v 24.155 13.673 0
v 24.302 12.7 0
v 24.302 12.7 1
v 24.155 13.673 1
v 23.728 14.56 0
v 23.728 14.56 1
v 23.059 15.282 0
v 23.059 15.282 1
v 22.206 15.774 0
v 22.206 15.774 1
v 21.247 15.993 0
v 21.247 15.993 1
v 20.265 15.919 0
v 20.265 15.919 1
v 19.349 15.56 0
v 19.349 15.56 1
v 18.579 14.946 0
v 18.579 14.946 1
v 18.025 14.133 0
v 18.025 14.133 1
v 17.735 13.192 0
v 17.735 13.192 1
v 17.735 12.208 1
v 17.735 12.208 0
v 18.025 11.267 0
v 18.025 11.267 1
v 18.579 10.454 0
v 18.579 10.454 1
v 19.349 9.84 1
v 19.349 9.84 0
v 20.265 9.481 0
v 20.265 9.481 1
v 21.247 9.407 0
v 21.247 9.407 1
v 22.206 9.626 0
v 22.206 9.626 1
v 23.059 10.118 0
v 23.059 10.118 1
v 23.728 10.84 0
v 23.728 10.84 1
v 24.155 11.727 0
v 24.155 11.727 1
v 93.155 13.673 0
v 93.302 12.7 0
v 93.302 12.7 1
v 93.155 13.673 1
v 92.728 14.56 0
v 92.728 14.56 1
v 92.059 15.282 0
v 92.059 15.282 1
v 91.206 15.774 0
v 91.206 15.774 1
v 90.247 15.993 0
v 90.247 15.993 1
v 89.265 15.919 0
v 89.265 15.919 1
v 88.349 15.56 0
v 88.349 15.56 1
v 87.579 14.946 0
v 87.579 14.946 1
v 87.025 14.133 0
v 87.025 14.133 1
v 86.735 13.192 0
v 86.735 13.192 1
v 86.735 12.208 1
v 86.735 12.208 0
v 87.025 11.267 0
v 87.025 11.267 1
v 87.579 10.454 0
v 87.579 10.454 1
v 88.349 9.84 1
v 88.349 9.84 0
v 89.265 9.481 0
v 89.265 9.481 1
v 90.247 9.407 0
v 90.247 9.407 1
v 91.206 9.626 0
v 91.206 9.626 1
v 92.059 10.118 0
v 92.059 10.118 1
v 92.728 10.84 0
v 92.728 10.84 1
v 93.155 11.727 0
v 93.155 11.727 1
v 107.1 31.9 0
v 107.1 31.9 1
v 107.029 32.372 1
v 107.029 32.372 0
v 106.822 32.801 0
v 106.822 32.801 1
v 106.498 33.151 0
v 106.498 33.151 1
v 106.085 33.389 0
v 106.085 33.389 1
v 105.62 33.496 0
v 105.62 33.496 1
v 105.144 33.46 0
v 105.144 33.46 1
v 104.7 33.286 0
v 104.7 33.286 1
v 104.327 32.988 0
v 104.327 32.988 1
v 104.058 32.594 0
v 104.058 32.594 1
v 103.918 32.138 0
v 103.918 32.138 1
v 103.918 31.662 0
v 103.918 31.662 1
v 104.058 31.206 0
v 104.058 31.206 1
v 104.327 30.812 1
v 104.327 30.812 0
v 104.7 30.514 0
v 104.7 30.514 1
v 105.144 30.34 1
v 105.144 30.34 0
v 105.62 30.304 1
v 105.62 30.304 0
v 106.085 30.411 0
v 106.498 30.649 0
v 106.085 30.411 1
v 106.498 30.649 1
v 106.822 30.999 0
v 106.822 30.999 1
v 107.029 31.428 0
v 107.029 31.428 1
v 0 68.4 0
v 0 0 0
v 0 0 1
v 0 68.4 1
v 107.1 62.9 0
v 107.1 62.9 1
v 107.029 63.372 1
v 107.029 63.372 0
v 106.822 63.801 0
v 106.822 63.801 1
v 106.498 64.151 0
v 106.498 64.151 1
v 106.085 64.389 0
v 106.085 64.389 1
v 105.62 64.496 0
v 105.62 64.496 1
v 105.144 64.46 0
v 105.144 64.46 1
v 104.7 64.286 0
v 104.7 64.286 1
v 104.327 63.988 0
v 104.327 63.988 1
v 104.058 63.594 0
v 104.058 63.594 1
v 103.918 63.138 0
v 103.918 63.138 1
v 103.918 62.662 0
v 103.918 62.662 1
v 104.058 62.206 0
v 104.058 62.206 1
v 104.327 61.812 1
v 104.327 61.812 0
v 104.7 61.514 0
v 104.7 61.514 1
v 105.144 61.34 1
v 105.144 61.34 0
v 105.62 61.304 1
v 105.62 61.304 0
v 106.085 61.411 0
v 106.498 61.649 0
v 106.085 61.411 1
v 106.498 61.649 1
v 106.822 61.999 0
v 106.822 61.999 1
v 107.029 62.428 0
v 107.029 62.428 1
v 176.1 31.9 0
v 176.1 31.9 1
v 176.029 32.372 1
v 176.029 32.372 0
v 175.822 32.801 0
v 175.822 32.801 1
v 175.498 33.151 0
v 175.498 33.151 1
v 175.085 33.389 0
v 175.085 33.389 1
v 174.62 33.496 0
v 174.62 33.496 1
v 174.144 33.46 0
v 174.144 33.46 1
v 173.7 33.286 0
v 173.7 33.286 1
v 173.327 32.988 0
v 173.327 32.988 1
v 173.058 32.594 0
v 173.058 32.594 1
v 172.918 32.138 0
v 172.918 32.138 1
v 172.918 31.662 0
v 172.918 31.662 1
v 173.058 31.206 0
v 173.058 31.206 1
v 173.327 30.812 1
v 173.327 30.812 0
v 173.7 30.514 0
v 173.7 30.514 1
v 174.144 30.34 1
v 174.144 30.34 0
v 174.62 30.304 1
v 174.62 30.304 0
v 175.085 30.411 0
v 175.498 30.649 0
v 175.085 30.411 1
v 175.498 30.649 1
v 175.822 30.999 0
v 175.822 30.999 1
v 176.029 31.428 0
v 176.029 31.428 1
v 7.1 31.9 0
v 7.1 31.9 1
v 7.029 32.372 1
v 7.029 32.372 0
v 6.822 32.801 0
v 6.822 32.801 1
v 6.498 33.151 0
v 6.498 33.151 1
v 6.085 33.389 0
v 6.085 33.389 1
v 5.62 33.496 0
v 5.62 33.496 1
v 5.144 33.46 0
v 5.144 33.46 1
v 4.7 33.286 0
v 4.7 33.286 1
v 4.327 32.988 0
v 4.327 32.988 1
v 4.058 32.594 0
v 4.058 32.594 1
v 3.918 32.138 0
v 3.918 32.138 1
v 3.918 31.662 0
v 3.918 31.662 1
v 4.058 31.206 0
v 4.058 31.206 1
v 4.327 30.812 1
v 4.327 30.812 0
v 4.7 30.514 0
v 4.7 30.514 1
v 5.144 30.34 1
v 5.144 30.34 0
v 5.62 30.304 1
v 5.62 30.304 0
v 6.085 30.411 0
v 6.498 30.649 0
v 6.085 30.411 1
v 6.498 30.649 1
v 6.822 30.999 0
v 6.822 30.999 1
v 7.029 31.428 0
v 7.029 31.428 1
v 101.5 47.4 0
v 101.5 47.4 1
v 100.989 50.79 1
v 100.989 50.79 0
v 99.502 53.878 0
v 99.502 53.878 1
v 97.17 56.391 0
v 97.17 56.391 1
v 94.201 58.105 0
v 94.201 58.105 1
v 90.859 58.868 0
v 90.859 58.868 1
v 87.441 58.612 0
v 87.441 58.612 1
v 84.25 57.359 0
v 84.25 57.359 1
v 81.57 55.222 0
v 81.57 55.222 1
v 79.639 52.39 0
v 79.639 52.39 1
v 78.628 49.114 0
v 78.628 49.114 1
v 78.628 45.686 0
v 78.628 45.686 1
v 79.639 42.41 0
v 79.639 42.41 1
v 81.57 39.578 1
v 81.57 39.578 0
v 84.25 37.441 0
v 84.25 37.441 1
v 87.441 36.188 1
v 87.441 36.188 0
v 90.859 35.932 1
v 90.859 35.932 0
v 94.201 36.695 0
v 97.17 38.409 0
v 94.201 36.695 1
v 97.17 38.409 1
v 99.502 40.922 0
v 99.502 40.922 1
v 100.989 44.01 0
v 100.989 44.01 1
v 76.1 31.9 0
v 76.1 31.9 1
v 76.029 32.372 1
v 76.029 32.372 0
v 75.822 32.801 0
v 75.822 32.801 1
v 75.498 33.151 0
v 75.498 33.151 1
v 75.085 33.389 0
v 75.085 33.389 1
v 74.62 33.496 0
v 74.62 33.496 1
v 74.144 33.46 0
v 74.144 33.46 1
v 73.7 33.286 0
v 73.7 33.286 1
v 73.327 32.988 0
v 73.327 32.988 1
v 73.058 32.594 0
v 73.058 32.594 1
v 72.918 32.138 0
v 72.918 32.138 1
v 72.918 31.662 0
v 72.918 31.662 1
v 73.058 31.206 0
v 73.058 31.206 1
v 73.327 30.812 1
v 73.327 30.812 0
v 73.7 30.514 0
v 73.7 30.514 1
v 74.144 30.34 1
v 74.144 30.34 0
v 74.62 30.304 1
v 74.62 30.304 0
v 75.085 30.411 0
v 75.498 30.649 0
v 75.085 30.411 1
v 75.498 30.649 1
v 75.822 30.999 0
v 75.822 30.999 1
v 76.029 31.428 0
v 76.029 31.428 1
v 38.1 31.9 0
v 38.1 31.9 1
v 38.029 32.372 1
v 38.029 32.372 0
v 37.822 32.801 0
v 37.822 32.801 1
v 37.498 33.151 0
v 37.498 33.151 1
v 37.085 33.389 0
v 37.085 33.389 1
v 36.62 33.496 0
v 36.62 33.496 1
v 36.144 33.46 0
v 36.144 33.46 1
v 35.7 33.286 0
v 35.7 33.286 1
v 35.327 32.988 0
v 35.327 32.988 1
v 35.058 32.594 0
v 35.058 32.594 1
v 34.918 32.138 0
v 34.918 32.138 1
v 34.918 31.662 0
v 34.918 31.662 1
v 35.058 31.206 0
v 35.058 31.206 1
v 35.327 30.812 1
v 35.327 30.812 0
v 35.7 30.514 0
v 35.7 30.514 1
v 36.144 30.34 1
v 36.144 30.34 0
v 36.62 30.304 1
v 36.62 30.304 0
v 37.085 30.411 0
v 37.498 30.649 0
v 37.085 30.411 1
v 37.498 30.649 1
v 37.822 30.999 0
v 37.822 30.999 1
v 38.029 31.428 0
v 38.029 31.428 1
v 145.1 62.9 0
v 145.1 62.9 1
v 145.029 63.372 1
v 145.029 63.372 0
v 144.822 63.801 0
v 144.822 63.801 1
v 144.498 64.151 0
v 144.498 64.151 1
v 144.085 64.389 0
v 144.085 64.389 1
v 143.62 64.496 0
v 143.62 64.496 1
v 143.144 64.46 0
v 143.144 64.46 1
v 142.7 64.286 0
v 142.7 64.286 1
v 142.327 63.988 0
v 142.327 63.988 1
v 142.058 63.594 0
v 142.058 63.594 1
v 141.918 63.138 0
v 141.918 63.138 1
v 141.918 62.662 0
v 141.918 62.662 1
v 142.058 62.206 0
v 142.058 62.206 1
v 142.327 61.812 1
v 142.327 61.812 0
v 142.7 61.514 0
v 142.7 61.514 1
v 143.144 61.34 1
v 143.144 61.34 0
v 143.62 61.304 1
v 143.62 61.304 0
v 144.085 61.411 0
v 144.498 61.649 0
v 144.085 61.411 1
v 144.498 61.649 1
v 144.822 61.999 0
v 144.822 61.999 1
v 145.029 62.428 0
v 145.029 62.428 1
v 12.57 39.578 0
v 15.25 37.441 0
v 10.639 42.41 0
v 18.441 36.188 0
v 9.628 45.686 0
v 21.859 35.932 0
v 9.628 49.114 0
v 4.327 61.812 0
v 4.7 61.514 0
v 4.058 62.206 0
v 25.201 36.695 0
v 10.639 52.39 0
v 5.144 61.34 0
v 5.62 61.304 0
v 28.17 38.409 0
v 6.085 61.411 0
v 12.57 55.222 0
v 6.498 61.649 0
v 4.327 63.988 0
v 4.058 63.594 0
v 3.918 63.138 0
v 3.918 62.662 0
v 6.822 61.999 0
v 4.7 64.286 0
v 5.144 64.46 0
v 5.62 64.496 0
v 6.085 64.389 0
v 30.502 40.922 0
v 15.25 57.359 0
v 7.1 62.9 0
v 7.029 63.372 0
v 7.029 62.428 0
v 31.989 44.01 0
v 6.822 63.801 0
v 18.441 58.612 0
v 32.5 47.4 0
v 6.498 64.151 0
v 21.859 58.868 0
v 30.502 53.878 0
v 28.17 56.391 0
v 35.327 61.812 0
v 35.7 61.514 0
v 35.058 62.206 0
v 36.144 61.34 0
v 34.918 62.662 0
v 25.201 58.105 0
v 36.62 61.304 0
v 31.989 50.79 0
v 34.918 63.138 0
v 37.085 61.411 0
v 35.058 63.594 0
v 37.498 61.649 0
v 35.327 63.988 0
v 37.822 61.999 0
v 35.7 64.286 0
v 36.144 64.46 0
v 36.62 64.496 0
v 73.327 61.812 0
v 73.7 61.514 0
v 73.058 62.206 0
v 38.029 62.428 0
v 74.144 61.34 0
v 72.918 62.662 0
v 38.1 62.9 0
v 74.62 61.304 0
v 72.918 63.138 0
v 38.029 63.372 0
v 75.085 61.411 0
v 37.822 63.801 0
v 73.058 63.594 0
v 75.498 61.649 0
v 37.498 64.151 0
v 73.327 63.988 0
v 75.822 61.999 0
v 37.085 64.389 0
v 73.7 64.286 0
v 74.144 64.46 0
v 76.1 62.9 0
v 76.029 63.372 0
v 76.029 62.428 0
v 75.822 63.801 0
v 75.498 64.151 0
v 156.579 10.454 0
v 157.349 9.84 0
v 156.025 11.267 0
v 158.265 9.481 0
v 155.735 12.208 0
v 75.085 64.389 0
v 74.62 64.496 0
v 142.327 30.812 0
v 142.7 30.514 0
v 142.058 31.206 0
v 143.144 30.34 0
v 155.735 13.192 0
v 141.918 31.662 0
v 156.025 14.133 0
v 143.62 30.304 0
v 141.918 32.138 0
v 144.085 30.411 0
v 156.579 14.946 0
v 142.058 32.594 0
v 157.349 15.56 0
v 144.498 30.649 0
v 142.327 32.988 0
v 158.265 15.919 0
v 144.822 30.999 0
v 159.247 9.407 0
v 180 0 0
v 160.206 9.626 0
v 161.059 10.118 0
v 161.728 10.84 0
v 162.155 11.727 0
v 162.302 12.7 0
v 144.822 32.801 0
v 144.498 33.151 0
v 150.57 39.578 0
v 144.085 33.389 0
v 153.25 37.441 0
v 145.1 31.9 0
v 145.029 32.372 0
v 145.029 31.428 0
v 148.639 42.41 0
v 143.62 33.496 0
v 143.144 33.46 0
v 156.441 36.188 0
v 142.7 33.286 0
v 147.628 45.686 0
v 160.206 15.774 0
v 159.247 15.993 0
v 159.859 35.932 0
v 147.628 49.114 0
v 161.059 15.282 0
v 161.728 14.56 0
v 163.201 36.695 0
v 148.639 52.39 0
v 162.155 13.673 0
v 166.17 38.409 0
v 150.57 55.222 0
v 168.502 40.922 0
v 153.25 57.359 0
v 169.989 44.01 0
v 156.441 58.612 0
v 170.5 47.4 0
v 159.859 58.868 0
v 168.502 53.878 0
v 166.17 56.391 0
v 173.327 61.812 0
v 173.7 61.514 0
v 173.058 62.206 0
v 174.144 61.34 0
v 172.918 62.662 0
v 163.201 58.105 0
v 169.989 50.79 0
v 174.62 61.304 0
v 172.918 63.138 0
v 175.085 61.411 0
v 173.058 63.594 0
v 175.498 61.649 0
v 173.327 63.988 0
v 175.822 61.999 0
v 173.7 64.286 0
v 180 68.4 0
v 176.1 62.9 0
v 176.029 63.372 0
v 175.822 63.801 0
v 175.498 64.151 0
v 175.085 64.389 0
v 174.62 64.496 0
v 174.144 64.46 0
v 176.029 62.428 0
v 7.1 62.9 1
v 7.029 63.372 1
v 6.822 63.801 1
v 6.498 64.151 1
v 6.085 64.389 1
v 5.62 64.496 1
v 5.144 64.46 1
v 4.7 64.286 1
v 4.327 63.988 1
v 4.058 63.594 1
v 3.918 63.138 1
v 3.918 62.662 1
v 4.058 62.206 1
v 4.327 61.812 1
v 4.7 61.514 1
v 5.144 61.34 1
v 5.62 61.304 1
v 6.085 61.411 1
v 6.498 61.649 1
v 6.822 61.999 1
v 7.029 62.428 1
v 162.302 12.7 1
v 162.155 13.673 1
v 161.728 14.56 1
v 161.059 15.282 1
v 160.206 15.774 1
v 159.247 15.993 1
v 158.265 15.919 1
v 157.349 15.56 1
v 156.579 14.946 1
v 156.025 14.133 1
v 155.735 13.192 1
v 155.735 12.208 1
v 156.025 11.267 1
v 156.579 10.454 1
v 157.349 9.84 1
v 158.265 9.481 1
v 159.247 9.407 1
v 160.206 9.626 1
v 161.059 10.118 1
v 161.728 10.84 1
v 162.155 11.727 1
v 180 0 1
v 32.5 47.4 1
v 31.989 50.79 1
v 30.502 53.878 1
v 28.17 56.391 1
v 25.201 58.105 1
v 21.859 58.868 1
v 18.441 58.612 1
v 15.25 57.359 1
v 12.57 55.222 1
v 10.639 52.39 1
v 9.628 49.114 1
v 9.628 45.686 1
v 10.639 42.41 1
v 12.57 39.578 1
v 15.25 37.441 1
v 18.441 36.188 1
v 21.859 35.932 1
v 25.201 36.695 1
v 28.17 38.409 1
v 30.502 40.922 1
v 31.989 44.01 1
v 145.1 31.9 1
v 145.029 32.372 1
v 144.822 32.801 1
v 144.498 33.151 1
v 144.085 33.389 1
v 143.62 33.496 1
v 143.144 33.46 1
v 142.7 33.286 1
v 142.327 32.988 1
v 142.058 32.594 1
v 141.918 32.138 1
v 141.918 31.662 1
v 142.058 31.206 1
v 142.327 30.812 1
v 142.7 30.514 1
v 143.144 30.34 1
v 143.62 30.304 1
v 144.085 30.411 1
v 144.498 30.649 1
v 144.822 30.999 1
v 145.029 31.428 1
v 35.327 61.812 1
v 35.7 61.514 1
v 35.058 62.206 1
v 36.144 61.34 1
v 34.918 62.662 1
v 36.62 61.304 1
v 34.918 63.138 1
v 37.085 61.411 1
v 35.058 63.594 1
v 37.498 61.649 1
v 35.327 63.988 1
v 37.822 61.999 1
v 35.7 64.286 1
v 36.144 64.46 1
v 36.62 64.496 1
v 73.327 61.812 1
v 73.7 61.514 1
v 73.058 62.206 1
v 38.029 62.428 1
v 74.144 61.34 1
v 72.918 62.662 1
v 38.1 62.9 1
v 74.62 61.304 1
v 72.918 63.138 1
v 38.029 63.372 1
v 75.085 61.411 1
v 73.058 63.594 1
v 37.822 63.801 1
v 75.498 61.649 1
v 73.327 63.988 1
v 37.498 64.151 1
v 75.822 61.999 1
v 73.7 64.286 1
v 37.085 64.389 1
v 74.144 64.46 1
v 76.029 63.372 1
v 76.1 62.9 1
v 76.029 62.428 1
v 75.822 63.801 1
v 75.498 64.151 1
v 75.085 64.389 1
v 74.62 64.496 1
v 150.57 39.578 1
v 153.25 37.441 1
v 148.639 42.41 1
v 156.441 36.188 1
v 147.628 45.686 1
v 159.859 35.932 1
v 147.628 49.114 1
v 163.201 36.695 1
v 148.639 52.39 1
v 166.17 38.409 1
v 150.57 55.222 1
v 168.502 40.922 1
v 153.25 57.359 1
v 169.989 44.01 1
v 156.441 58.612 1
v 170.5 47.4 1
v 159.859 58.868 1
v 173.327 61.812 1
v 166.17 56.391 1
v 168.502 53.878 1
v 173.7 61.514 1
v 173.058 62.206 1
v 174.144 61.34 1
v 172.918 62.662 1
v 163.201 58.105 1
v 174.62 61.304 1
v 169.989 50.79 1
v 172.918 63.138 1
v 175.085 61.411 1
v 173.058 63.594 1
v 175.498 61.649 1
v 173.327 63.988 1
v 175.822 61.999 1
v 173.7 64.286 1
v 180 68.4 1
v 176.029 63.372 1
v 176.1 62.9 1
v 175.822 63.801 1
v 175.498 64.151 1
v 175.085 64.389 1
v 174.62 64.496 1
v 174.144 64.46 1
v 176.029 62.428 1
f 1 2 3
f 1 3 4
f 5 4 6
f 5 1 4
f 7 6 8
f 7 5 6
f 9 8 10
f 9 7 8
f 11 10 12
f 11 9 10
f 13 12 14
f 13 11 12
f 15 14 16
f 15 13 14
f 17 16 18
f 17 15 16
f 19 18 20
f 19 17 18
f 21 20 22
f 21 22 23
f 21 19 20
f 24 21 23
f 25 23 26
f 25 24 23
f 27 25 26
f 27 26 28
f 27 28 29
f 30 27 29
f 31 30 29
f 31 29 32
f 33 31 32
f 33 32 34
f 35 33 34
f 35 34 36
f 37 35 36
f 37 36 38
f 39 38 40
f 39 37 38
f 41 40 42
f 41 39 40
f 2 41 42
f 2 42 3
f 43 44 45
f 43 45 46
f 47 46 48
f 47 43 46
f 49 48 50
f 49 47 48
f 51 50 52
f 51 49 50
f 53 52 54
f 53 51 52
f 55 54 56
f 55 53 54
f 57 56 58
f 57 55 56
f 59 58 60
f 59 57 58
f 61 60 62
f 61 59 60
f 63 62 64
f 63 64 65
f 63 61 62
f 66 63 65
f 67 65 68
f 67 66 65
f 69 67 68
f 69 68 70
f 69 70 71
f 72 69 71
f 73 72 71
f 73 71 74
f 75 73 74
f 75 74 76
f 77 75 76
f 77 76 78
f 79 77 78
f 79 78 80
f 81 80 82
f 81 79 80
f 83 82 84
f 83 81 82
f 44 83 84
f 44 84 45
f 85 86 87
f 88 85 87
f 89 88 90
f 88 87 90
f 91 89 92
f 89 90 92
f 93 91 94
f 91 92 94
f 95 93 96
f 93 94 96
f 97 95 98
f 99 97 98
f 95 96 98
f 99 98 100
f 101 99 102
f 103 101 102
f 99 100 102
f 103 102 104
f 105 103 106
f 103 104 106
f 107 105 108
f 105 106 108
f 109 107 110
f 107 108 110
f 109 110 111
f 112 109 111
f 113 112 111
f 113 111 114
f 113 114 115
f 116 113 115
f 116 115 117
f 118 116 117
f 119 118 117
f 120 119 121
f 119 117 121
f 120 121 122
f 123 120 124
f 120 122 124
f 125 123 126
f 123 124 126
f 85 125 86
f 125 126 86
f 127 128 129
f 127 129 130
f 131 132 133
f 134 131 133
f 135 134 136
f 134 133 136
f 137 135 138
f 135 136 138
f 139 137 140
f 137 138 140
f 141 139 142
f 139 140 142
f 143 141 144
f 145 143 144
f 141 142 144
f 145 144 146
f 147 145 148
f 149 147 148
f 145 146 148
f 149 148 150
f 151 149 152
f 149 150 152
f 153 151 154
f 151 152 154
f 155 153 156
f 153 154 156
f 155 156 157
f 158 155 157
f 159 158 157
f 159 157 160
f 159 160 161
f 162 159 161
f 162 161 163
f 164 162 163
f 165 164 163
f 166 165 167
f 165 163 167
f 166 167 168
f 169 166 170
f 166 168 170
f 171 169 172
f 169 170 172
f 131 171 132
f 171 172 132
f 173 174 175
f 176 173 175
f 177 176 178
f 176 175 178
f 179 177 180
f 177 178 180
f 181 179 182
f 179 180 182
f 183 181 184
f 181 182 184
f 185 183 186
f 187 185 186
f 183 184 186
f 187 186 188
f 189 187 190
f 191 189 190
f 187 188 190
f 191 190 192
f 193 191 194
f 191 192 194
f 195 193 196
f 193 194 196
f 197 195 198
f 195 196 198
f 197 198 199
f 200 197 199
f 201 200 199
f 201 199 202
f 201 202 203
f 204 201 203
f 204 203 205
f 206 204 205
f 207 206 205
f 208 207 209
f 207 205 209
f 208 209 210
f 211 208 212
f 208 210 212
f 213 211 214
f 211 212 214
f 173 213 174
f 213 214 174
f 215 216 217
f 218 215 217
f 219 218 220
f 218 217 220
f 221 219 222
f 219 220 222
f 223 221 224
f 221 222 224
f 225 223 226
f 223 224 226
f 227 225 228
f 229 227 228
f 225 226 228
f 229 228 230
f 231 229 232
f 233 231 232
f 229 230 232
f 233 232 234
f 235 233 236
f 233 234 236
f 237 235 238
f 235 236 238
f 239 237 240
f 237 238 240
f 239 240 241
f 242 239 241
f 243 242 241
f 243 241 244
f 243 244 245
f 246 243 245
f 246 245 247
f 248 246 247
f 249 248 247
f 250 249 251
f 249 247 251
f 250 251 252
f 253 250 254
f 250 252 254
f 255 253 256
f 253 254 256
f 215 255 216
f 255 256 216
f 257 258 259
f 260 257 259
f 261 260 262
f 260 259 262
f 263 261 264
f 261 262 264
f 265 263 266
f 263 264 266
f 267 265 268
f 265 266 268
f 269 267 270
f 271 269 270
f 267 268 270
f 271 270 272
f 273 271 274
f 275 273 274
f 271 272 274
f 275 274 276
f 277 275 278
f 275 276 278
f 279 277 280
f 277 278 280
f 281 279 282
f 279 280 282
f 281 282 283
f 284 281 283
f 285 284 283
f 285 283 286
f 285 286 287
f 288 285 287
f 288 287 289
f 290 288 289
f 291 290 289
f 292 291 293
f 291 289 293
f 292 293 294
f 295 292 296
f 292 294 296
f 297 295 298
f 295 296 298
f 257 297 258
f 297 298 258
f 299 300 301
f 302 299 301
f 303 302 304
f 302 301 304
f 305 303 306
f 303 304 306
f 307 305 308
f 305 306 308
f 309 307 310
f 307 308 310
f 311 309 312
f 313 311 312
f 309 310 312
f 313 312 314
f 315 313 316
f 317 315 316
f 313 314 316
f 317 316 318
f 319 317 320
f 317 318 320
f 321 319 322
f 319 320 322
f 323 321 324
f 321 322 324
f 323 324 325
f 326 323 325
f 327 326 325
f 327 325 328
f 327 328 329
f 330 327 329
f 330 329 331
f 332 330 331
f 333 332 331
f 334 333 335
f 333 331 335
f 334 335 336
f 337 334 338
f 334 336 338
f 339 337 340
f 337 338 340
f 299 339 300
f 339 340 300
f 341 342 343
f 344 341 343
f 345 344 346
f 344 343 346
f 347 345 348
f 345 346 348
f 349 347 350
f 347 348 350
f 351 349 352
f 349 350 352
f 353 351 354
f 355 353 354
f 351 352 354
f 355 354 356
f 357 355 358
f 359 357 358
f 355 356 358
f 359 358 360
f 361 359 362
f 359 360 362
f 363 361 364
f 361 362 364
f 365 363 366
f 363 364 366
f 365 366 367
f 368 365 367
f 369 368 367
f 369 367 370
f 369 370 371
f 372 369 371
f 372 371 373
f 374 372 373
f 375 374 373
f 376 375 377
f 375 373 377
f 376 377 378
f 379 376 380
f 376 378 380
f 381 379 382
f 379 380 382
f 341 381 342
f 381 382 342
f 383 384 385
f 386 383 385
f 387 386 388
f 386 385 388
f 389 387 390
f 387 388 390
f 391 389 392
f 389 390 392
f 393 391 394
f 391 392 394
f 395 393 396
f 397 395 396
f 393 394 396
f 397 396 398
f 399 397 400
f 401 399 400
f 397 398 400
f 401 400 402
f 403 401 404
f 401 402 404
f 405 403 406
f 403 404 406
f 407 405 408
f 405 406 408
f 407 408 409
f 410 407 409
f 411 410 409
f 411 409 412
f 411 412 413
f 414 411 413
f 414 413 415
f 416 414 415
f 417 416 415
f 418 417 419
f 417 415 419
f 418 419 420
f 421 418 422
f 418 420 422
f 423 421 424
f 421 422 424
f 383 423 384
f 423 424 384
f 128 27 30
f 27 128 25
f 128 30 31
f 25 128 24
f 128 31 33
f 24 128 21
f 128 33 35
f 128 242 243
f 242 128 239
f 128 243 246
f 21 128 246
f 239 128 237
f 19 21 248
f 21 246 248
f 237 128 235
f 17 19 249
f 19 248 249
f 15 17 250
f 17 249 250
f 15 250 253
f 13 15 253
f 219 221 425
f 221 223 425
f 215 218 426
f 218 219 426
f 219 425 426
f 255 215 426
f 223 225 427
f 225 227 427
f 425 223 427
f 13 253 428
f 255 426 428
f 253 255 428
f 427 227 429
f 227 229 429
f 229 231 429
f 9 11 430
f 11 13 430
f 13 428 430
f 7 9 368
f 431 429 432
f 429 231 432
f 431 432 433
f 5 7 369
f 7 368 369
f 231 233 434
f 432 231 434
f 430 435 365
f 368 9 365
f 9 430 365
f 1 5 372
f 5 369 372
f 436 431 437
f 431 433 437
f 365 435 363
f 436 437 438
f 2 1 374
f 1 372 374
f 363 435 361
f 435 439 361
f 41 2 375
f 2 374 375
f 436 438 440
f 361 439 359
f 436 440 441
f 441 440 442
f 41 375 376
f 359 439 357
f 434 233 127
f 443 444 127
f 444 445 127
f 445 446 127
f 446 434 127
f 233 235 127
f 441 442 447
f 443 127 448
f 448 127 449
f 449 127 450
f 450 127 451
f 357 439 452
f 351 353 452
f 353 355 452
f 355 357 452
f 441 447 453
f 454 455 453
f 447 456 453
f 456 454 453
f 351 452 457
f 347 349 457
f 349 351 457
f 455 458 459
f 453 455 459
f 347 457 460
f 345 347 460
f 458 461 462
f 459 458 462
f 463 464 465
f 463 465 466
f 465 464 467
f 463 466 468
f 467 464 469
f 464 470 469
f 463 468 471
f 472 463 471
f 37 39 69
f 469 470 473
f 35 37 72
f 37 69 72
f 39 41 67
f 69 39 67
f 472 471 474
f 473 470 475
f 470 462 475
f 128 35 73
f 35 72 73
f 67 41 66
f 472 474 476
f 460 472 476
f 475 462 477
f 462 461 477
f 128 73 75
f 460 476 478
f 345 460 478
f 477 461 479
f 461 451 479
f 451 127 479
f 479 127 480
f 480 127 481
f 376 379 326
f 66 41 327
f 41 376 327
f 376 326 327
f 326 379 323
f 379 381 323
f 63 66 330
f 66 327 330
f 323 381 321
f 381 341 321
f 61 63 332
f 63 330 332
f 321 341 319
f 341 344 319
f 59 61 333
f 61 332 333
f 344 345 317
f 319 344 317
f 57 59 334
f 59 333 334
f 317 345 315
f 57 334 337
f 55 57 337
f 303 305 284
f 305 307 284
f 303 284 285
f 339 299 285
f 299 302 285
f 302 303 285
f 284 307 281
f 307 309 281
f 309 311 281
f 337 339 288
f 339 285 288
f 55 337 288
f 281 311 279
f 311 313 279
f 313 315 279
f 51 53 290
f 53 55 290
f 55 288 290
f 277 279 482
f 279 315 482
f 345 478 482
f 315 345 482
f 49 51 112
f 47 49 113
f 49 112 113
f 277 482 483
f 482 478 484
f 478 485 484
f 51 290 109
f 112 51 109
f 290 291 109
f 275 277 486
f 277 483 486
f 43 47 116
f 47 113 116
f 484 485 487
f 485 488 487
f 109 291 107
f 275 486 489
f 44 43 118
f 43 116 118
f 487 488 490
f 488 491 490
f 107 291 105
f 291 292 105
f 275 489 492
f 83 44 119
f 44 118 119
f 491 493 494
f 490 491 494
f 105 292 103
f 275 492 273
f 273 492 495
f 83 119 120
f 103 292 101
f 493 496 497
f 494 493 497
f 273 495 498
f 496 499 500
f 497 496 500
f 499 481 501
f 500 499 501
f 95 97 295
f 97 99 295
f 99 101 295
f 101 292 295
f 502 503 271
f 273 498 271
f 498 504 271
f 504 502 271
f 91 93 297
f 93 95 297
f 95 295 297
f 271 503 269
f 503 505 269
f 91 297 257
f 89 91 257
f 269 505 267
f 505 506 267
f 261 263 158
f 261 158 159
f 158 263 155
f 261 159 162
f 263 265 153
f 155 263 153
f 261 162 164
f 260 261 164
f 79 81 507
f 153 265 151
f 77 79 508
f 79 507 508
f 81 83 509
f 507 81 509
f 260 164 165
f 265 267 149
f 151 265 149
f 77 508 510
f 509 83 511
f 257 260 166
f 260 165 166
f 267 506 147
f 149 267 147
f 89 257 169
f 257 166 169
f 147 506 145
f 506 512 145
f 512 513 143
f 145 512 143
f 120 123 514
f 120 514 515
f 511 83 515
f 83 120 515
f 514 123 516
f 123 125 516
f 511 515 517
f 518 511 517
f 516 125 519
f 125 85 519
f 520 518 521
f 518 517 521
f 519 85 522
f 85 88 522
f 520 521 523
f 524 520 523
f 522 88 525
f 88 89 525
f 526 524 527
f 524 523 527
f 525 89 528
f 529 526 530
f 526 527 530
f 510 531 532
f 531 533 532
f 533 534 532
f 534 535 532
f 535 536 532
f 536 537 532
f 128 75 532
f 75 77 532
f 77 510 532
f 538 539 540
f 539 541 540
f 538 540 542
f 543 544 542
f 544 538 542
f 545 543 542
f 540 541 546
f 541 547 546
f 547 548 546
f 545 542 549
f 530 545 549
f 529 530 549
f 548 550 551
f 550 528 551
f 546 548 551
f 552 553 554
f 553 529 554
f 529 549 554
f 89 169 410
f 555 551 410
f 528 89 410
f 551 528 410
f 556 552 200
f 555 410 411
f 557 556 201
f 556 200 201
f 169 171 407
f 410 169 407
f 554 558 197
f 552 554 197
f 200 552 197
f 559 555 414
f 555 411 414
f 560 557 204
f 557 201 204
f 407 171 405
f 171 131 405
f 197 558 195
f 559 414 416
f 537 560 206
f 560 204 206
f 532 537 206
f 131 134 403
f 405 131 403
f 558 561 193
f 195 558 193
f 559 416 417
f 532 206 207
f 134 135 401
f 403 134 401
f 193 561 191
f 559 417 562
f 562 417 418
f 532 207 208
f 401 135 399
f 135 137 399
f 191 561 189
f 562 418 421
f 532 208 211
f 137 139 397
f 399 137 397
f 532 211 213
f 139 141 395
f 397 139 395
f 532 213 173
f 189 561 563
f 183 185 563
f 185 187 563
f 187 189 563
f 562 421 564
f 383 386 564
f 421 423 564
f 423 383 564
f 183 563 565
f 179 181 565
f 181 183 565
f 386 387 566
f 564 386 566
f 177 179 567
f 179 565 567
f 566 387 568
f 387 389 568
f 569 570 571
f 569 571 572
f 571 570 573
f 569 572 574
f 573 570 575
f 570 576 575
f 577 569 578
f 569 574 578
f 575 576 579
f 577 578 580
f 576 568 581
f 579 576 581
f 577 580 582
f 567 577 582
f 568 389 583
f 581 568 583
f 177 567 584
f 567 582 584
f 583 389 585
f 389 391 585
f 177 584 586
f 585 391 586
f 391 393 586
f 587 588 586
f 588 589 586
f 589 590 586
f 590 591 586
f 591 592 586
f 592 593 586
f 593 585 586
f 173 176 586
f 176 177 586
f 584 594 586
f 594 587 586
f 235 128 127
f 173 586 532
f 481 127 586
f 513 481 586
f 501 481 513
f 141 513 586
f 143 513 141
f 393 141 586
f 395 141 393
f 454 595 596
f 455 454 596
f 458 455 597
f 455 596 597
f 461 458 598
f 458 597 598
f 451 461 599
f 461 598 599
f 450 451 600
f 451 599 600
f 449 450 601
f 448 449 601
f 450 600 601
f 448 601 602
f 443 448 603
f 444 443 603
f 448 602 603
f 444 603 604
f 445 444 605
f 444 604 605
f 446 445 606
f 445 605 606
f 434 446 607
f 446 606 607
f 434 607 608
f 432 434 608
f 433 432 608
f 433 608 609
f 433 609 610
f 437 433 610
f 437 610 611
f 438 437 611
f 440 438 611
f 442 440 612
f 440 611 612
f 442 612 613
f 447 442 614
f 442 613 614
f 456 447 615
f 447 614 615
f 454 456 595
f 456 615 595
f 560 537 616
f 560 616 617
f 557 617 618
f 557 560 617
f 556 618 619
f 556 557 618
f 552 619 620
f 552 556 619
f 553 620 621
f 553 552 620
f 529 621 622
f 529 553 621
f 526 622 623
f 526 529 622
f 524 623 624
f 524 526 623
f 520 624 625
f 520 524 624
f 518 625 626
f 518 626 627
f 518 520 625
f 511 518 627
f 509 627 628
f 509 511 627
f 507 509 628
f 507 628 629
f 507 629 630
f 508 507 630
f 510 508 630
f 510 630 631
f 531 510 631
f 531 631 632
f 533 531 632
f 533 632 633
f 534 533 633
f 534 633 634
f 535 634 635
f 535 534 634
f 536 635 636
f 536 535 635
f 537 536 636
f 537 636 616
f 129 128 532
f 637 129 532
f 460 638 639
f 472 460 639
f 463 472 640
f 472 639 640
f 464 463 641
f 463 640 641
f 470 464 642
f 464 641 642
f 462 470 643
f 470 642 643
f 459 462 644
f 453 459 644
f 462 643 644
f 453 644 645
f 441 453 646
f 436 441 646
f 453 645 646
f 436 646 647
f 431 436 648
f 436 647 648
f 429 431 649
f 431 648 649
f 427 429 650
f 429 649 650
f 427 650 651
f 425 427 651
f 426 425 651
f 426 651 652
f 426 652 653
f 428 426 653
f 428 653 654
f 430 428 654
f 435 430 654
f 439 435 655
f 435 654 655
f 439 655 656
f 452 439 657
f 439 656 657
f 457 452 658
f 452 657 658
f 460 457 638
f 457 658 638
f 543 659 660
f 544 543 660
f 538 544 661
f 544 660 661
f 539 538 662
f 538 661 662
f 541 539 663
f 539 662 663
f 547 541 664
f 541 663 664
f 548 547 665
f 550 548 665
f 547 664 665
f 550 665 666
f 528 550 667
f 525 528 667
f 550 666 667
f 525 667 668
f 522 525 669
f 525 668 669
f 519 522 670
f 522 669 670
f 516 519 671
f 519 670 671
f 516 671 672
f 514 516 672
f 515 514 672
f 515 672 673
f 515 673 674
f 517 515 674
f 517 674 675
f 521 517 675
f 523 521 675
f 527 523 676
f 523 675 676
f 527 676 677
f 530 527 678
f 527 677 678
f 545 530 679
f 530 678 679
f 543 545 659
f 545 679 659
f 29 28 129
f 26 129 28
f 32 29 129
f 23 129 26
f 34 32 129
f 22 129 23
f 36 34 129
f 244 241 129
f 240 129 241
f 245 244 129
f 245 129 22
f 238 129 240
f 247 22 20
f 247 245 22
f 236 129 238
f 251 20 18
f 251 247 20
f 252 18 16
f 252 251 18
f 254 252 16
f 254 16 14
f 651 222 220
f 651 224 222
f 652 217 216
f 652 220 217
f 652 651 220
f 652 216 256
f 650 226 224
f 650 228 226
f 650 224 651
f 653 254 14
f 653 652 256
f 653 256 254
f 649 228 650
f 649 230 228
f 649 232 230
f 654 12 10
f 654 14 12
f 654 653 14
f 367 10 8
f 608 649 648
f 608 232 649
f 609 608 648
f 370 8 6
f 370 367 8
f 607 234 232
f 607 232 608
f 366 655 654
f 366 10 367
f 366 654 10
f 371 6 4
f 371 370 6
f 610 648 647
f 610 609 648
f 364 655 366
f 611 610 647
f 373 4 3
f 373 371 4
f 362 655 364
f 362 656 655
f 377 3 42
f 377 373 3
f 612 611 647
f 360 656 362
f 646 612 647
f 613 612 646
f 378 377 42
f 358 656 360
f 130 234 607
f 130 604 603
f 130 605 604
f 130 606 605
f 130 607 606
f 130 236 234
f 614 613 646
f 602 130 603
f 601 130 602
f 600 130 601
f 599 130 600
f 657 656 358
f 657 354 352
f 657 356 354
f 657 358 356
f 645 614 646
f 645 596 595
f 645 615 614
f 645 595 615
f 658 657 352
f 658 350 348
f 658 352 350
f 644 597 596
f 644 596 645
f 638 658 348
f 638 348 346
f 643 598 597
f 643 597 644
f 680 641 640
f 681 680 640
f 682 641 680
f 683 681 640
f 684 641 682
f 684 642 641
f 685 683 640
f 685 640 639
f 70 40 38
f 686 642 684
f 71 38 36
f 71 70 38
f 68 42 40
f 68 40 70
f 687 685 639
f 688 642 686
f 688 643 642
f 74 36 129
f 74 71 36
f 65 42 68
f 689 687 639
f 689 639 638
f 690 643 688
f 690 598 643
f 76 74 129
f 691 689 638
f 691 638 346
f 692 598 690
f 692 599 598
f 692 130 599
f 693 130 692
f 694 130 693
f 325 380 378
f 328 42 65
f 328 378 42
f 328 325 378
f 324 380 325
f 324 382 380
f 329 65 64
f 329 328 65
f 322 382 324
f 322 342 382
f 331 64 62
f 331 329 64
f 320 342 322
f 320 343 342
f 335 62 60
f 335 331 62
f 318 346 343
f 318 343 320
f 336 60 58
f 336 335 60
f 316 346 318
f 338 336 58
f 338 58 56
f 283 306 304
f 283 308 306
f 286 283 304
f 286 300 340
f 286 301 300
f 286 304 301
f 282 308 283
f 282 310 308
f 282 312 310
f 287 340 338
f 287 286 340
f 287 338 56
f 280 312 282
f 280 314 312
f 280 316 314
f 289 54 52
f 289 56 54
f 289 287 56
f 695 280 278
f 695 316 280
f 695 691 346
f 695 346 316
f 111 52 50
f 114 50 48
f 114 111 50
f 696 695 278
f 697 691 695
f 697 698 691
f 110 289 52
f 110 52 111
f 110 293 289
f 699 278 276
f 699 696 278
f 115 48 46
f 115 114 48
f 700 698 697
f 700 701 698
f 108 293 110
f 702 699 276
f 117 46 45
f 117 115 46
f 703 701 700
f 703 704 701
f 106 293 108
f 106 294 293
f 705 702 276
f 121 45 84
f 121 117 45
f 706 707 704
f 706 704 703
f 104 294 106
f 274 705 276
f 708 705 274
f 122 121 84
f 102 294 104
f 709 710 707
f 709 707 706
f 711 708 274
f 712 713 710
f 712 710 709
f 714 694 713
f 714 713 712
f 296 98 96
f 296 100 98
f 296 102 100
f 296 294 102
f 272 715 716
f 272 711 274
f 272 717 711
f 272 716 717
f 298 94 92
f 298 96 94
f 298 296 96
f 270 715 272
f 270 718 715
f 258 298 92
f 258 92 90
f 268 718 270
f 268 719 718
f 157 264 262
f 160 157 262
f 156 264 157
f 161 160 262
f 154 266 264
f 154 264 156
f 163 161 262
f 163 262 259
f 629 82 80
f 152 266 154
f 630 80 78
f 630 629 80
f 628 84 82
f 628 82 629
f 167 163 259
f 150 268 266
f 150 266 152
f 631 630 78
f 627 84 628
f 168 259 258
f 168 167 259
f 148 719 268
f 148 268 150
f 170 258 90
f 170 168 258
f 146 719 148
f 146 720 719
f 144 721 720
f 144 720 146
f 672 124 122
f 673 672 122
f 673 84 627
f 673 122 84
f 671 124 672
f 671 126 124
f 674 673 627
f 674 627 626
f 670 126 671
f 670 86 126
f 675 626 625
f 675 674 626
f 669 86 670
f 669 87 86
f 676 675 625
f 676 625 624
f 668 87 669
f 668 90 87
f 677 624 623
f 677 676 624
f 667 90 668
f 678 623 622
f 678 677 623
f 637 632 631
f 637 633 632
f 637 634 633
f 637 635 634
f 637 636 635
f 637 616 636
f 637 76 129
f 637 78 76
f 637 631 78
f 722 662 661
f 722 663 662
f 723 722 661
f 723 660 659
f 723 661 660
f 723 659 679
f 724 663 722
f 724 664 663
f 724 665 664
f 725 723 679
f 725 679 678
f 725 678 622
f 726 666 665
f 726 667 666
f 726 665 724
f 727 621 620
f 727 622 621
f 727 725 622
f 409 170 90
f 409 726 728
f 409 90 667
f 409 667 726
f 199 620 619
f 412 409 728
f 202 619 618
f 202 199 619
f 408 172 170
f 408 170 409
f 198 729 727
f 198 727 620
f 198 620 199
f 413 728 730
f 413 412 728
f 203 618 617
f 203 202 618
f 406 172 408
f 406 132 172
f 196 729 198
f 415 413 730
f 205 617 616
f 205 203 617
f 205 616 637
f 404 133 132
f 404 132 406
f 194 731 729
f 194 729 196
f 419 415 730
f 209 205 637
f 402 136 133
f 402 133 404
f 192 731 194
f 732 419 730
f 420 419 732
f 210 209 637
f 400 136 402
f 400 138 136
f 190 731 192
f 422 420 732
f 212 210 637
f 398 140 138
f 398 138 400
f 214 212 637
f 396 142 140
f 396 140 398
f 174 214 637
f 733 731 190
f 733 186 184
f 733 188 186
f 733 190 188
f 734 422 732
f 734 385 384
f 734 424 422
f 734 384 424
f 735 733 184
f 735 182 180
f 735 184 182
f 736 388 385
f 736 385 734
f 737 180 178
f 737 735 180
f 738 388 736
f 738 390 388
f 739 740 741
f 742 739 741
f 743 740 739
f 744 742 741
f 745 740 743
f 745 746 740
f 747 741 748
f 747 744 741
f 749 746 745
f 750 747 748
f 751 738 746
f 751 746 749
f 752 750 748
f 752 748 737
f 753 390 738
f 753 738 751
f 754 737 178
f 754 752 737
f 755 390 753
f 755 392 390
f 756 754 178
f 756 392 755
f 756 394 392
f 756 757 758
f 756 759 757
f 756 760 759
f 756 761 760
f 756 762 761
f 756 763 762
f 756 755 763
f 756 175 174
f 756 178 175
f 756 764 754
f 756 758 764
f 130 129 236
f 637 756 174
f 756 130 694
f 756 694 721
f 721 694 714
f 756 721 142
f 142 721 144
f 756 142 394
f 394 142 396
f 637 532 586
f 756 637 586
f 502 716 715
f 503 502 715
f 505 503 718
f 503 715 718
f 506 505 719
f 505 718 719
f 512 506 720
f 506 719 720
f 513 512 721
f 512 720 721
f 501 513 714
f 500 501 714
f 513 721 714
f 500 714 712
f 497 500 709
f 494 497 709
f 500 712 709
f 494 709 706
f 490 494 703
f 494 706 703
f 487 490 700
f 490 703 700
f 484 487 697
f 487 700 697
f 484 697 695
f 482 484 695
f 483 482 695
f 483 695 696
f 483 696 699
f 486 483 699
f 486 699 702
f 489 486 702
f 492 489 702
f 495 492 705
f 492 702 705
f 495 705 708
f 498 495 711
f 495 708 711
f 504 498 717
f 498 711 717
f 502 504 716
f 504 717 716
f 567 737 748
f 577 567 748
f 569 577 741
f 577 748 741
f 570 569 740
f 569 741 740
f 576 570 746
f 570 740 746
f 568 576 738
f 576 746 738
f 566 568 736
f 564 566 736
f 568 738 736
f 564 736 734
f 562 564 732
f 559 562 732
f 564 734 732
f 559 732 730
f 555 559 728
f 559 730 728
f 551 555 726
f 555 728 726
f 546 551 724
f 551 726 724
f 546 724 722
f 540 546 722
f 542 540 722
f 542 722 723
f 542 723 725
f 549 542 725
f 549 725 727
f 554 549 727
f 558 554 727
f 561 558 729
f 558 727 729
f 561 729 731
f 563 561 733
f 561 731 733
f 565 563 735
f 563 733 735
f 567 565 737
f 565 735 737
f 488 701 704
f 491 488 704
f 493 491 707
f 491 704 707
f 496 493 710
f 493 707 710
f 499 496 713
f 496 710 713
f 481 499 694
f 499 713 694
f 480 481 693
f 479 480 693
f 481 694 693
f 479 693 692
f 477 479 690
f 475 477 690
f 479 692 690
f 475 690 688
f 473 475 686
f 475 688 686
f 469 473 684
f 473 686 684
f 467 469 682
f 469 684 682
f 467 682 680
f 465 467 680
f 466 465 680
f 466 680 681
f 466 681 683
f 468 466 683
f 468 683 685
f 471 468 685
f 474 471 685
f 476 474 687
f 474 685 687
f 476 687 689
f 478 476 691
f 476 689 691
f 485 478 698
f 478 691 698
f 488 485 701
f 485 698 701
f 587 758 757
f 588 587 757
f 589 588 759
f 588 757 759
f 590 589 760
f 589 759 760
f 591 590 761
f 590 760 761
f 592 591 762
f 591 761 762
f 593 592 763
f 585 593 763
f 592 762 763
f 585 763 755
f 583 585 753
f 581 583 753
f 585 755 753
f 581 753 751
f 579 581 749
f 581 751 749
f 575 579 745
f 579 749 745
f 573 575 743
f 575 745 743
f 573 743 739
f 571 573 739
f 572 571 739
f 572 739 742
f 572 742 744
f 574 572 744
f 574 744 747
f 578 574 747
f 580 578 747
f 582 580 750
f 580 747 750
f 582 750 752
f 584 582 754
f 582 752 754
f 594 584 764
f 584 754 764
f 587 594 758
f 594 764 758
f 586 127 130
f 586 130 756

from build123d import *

# Parameters (mm, degrees)
SKETCH1_W           = 180
SKETCH1_H           = 68.4
SKETCH1_R           = 3.302
BOSS_EXTRUDE1_DEPTH = 1
SKETCH2_R           = 11.5
SKETCH2_R_2         = 1.6
CUT_EXTRUDE1_DEPTH  = 1
LPATTERN1_COUNT     = 3
LPATTERN1_PITCH     = 69


with BuildPart() as part:
    # Sketch1 → Boss-Extrude1 (new body)
    with BuildSketch(Plane.XY):
        with Locations((90, 34.2)):
            Rectangle(SKETCH1_W, SKETCH1_H)
        with Locations((21, 12.7)):
            Circle(SKETCH1_R, mode=Mode.SUBTRACT)
        with Locations((90, 12.7)):
            Circle(SKETCH1_R, mode=Mode.SUBTRACT)
        with Locations((159, 12.7)):
            Circle(SKETCH1_R, mode=Mode.SUBTRACT)
    extrude(amount=BOSS_EXTRUDE1_DEPTH)

    # Sketch2 → Cut-Extrude1 (cut)
    with BuildSketch(Plane.XY.offset(1)):
        with Locations((21, 47.4)):
            Circle(SKETCH2_R)
        with Locations((36.5, 62.9)):
            Circle(SKETCH2_R_2)
        with Locations((36.5, 31.9)):
            Circle(SKETCH2_R_2)
        with Locations((5.5, 31.9)):
            Circle(SKETCH2_R_2)
        with Locations((5.5, 62.9)):
            Circle(SKETCH2_R_2)
    cut_extrude1 = extrude(amount=-CUT_EXTRUDE1_DEPTH, mode=Mode.SUBTRACT)

    # LPattern1: Cut-Extrude1 ×3
    with Locations(*[(i * LPATTERN1_PITCH, 0, 0) for i in range(1, LPATTERN1_COUNT)]):
        add(cut_extrude1, mode=Mode.SUBTRACT)


solid = part.part
